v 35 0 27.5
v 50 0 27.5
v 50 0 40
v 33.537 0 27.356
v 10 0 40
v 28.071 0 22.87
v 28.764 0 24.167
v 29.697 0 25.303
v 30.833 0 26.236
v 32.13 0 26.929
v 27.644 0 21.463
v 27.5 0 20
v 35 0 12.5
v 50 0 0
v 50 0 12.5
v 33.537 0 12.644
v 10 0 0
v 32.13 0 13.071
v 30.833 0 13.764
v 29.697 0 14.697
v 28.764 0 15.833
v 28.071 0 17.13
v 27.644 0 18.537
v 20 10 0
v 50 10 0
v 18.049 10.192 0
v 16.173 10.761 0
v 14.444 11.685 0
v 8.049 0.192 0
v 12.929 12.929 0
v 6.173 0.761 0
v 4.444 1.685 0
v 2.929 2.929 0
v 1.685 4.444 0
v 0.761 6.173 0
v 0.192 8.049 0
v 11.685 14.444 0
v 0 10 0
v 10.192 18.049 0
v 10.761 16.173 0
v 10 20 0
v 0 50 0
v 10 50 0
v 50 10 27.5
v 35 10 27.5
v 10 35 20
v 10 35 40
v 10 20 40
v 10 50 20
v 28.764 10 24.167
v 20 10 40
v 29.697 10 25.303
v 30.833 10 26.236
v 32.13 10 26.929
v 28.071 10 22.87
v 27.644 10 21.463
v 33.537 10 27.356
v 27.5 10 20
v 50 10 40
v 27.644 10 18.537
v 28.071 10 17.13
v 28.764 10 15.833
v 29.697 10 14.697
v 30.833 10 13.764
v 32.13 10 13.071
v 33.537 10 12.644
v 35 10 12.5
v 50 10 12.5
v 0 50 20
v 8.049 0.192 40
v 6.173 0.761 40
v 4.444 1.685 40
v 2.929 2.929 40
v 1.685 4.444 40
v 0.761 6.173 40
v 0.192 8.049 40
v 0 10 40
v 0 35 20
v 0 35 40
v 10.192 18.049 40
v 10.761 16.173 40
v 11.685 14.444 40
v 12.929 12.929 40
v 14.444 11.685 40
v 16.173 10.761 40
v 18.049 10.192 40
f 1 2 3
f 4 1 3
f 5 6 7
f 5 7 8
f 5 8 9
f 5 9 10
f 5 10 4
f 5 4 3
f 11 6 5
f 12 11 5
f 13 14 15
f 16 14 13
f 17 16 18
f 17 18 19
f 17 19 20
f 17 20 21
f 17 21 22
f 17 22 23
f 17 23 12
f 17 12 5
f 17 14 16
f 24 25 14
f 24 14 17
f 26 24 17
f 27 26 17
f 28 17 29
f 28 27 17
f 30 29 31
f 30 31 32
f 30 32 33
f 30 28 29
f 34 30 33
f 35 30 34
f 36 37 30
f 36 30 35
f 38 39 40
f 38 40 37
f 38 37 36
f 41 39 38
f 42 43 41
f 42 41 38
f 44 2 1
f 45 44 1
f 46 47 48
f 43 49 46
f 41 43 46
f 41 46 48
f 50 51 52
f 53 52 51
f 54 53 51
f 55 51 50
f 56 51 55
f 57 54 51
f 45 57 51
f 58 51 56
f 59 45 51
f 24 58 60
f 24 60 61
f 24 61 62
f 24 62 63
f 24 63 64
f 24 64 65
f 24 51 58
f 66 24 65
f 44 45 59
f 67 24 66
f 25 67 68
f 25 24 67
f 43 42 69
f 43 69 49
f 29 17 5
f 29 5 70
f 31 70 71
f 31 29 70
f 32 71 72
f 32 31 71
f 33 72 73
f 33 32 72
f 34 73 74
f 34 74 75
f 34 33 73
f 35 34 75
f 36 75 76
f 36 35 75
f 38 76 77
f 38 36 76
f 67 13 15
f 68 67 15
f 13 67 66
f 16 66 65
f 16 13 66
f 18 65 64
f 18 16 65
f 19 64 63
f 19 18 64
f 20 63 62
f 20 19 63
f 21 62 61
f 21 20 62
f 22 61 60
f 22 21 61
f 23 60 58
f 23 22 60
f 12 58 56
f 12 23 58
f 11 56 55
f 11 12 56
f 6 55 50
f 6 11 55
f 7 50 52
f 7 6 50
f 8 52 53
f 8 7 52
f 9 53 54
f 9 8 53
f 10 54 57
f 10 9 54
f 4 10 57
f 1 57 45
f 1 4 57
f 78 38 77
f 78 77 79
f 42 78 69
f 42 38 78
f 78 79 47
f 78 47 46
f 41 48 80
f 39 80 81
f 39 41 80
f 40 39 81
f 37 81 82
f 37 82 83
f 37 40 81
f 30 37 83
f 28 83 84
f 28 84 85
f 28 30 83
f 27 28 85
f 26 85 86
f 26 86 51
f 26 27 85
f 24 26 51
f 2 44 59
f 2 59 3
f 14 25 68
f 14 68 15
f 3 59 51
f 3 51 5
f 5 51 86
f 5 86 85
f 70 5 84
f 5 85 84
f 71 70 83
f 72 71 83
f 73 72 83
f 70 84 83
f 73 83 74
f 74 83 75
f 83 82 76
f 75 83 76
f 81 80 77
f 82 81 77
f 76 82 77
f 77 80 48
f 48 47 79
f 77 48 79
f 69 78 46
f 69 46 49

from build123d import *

# Parameters (mm, degrees)
BOSS_EXTRUDE2_DEPTH = 40
SKETCH4_W           = 20
SKETCH4_H           = 15
CUT_EXTRUDE1_DEPTH  = 10
SKETCH5_R           = 7.5
CUT_EXTRUDE2_DEPTH  = 13


with BuildPart() as part:
    # Sketch2 → Boss-Extrude2 (new body)
    with BuildSketch(Plane.XY):
        with BuildLine():
            Line((0, 10), (0, 50))
            Line((0, 50), (10, 50))
            Line((10, 50), (10, 20))
            ThreePointArc((10, 20), (12.928932188, 12.928932188), (20, 10))
            Line((20, 10), (50, 10))
            Line((50, 10), (50, 0))
            Line((50, 0), (10, 0))
            ThreePointArc((10, 0), (2.928932188, 2.928932188), (0, 10))
        make_face()
    extrude(amount=BOSS_EXTRUDE2_DEPTH)

    # Sketch4 → Cut-Extrude1 (cut)
    with BuildSketch(Plane(origin=(0, 0, 0), x_dir=(0, 0, -1), z_dir=(1, 0, 0))):
        with Locations((-30, 42.5)):
            Rectangle(SKETCH4_W, SKETCH4_H)
    extrude(amount=CUT_EXTRUDE1_DEPTH, mode=Mode.SUBTRACT)

    # Sketch5 → Cut-Extrude2 (cut)
    with BuildSketch(Plane(origin=(0, 0, 0), x_dir=(1, 0, 0), z_dir=(0, 1, 0))):
        with Locations((35, -20)):
            Circle(SKETCH5_R)
        Polygon((35, -20), (35, -12.5), (50, -12.5), (50, -27.5), (35, -27.5), align=None)
    extrude(amount=CUT_EXTRUDE2_DEPTH, mode=Mode.SUBTRACT)


solid = part.part
